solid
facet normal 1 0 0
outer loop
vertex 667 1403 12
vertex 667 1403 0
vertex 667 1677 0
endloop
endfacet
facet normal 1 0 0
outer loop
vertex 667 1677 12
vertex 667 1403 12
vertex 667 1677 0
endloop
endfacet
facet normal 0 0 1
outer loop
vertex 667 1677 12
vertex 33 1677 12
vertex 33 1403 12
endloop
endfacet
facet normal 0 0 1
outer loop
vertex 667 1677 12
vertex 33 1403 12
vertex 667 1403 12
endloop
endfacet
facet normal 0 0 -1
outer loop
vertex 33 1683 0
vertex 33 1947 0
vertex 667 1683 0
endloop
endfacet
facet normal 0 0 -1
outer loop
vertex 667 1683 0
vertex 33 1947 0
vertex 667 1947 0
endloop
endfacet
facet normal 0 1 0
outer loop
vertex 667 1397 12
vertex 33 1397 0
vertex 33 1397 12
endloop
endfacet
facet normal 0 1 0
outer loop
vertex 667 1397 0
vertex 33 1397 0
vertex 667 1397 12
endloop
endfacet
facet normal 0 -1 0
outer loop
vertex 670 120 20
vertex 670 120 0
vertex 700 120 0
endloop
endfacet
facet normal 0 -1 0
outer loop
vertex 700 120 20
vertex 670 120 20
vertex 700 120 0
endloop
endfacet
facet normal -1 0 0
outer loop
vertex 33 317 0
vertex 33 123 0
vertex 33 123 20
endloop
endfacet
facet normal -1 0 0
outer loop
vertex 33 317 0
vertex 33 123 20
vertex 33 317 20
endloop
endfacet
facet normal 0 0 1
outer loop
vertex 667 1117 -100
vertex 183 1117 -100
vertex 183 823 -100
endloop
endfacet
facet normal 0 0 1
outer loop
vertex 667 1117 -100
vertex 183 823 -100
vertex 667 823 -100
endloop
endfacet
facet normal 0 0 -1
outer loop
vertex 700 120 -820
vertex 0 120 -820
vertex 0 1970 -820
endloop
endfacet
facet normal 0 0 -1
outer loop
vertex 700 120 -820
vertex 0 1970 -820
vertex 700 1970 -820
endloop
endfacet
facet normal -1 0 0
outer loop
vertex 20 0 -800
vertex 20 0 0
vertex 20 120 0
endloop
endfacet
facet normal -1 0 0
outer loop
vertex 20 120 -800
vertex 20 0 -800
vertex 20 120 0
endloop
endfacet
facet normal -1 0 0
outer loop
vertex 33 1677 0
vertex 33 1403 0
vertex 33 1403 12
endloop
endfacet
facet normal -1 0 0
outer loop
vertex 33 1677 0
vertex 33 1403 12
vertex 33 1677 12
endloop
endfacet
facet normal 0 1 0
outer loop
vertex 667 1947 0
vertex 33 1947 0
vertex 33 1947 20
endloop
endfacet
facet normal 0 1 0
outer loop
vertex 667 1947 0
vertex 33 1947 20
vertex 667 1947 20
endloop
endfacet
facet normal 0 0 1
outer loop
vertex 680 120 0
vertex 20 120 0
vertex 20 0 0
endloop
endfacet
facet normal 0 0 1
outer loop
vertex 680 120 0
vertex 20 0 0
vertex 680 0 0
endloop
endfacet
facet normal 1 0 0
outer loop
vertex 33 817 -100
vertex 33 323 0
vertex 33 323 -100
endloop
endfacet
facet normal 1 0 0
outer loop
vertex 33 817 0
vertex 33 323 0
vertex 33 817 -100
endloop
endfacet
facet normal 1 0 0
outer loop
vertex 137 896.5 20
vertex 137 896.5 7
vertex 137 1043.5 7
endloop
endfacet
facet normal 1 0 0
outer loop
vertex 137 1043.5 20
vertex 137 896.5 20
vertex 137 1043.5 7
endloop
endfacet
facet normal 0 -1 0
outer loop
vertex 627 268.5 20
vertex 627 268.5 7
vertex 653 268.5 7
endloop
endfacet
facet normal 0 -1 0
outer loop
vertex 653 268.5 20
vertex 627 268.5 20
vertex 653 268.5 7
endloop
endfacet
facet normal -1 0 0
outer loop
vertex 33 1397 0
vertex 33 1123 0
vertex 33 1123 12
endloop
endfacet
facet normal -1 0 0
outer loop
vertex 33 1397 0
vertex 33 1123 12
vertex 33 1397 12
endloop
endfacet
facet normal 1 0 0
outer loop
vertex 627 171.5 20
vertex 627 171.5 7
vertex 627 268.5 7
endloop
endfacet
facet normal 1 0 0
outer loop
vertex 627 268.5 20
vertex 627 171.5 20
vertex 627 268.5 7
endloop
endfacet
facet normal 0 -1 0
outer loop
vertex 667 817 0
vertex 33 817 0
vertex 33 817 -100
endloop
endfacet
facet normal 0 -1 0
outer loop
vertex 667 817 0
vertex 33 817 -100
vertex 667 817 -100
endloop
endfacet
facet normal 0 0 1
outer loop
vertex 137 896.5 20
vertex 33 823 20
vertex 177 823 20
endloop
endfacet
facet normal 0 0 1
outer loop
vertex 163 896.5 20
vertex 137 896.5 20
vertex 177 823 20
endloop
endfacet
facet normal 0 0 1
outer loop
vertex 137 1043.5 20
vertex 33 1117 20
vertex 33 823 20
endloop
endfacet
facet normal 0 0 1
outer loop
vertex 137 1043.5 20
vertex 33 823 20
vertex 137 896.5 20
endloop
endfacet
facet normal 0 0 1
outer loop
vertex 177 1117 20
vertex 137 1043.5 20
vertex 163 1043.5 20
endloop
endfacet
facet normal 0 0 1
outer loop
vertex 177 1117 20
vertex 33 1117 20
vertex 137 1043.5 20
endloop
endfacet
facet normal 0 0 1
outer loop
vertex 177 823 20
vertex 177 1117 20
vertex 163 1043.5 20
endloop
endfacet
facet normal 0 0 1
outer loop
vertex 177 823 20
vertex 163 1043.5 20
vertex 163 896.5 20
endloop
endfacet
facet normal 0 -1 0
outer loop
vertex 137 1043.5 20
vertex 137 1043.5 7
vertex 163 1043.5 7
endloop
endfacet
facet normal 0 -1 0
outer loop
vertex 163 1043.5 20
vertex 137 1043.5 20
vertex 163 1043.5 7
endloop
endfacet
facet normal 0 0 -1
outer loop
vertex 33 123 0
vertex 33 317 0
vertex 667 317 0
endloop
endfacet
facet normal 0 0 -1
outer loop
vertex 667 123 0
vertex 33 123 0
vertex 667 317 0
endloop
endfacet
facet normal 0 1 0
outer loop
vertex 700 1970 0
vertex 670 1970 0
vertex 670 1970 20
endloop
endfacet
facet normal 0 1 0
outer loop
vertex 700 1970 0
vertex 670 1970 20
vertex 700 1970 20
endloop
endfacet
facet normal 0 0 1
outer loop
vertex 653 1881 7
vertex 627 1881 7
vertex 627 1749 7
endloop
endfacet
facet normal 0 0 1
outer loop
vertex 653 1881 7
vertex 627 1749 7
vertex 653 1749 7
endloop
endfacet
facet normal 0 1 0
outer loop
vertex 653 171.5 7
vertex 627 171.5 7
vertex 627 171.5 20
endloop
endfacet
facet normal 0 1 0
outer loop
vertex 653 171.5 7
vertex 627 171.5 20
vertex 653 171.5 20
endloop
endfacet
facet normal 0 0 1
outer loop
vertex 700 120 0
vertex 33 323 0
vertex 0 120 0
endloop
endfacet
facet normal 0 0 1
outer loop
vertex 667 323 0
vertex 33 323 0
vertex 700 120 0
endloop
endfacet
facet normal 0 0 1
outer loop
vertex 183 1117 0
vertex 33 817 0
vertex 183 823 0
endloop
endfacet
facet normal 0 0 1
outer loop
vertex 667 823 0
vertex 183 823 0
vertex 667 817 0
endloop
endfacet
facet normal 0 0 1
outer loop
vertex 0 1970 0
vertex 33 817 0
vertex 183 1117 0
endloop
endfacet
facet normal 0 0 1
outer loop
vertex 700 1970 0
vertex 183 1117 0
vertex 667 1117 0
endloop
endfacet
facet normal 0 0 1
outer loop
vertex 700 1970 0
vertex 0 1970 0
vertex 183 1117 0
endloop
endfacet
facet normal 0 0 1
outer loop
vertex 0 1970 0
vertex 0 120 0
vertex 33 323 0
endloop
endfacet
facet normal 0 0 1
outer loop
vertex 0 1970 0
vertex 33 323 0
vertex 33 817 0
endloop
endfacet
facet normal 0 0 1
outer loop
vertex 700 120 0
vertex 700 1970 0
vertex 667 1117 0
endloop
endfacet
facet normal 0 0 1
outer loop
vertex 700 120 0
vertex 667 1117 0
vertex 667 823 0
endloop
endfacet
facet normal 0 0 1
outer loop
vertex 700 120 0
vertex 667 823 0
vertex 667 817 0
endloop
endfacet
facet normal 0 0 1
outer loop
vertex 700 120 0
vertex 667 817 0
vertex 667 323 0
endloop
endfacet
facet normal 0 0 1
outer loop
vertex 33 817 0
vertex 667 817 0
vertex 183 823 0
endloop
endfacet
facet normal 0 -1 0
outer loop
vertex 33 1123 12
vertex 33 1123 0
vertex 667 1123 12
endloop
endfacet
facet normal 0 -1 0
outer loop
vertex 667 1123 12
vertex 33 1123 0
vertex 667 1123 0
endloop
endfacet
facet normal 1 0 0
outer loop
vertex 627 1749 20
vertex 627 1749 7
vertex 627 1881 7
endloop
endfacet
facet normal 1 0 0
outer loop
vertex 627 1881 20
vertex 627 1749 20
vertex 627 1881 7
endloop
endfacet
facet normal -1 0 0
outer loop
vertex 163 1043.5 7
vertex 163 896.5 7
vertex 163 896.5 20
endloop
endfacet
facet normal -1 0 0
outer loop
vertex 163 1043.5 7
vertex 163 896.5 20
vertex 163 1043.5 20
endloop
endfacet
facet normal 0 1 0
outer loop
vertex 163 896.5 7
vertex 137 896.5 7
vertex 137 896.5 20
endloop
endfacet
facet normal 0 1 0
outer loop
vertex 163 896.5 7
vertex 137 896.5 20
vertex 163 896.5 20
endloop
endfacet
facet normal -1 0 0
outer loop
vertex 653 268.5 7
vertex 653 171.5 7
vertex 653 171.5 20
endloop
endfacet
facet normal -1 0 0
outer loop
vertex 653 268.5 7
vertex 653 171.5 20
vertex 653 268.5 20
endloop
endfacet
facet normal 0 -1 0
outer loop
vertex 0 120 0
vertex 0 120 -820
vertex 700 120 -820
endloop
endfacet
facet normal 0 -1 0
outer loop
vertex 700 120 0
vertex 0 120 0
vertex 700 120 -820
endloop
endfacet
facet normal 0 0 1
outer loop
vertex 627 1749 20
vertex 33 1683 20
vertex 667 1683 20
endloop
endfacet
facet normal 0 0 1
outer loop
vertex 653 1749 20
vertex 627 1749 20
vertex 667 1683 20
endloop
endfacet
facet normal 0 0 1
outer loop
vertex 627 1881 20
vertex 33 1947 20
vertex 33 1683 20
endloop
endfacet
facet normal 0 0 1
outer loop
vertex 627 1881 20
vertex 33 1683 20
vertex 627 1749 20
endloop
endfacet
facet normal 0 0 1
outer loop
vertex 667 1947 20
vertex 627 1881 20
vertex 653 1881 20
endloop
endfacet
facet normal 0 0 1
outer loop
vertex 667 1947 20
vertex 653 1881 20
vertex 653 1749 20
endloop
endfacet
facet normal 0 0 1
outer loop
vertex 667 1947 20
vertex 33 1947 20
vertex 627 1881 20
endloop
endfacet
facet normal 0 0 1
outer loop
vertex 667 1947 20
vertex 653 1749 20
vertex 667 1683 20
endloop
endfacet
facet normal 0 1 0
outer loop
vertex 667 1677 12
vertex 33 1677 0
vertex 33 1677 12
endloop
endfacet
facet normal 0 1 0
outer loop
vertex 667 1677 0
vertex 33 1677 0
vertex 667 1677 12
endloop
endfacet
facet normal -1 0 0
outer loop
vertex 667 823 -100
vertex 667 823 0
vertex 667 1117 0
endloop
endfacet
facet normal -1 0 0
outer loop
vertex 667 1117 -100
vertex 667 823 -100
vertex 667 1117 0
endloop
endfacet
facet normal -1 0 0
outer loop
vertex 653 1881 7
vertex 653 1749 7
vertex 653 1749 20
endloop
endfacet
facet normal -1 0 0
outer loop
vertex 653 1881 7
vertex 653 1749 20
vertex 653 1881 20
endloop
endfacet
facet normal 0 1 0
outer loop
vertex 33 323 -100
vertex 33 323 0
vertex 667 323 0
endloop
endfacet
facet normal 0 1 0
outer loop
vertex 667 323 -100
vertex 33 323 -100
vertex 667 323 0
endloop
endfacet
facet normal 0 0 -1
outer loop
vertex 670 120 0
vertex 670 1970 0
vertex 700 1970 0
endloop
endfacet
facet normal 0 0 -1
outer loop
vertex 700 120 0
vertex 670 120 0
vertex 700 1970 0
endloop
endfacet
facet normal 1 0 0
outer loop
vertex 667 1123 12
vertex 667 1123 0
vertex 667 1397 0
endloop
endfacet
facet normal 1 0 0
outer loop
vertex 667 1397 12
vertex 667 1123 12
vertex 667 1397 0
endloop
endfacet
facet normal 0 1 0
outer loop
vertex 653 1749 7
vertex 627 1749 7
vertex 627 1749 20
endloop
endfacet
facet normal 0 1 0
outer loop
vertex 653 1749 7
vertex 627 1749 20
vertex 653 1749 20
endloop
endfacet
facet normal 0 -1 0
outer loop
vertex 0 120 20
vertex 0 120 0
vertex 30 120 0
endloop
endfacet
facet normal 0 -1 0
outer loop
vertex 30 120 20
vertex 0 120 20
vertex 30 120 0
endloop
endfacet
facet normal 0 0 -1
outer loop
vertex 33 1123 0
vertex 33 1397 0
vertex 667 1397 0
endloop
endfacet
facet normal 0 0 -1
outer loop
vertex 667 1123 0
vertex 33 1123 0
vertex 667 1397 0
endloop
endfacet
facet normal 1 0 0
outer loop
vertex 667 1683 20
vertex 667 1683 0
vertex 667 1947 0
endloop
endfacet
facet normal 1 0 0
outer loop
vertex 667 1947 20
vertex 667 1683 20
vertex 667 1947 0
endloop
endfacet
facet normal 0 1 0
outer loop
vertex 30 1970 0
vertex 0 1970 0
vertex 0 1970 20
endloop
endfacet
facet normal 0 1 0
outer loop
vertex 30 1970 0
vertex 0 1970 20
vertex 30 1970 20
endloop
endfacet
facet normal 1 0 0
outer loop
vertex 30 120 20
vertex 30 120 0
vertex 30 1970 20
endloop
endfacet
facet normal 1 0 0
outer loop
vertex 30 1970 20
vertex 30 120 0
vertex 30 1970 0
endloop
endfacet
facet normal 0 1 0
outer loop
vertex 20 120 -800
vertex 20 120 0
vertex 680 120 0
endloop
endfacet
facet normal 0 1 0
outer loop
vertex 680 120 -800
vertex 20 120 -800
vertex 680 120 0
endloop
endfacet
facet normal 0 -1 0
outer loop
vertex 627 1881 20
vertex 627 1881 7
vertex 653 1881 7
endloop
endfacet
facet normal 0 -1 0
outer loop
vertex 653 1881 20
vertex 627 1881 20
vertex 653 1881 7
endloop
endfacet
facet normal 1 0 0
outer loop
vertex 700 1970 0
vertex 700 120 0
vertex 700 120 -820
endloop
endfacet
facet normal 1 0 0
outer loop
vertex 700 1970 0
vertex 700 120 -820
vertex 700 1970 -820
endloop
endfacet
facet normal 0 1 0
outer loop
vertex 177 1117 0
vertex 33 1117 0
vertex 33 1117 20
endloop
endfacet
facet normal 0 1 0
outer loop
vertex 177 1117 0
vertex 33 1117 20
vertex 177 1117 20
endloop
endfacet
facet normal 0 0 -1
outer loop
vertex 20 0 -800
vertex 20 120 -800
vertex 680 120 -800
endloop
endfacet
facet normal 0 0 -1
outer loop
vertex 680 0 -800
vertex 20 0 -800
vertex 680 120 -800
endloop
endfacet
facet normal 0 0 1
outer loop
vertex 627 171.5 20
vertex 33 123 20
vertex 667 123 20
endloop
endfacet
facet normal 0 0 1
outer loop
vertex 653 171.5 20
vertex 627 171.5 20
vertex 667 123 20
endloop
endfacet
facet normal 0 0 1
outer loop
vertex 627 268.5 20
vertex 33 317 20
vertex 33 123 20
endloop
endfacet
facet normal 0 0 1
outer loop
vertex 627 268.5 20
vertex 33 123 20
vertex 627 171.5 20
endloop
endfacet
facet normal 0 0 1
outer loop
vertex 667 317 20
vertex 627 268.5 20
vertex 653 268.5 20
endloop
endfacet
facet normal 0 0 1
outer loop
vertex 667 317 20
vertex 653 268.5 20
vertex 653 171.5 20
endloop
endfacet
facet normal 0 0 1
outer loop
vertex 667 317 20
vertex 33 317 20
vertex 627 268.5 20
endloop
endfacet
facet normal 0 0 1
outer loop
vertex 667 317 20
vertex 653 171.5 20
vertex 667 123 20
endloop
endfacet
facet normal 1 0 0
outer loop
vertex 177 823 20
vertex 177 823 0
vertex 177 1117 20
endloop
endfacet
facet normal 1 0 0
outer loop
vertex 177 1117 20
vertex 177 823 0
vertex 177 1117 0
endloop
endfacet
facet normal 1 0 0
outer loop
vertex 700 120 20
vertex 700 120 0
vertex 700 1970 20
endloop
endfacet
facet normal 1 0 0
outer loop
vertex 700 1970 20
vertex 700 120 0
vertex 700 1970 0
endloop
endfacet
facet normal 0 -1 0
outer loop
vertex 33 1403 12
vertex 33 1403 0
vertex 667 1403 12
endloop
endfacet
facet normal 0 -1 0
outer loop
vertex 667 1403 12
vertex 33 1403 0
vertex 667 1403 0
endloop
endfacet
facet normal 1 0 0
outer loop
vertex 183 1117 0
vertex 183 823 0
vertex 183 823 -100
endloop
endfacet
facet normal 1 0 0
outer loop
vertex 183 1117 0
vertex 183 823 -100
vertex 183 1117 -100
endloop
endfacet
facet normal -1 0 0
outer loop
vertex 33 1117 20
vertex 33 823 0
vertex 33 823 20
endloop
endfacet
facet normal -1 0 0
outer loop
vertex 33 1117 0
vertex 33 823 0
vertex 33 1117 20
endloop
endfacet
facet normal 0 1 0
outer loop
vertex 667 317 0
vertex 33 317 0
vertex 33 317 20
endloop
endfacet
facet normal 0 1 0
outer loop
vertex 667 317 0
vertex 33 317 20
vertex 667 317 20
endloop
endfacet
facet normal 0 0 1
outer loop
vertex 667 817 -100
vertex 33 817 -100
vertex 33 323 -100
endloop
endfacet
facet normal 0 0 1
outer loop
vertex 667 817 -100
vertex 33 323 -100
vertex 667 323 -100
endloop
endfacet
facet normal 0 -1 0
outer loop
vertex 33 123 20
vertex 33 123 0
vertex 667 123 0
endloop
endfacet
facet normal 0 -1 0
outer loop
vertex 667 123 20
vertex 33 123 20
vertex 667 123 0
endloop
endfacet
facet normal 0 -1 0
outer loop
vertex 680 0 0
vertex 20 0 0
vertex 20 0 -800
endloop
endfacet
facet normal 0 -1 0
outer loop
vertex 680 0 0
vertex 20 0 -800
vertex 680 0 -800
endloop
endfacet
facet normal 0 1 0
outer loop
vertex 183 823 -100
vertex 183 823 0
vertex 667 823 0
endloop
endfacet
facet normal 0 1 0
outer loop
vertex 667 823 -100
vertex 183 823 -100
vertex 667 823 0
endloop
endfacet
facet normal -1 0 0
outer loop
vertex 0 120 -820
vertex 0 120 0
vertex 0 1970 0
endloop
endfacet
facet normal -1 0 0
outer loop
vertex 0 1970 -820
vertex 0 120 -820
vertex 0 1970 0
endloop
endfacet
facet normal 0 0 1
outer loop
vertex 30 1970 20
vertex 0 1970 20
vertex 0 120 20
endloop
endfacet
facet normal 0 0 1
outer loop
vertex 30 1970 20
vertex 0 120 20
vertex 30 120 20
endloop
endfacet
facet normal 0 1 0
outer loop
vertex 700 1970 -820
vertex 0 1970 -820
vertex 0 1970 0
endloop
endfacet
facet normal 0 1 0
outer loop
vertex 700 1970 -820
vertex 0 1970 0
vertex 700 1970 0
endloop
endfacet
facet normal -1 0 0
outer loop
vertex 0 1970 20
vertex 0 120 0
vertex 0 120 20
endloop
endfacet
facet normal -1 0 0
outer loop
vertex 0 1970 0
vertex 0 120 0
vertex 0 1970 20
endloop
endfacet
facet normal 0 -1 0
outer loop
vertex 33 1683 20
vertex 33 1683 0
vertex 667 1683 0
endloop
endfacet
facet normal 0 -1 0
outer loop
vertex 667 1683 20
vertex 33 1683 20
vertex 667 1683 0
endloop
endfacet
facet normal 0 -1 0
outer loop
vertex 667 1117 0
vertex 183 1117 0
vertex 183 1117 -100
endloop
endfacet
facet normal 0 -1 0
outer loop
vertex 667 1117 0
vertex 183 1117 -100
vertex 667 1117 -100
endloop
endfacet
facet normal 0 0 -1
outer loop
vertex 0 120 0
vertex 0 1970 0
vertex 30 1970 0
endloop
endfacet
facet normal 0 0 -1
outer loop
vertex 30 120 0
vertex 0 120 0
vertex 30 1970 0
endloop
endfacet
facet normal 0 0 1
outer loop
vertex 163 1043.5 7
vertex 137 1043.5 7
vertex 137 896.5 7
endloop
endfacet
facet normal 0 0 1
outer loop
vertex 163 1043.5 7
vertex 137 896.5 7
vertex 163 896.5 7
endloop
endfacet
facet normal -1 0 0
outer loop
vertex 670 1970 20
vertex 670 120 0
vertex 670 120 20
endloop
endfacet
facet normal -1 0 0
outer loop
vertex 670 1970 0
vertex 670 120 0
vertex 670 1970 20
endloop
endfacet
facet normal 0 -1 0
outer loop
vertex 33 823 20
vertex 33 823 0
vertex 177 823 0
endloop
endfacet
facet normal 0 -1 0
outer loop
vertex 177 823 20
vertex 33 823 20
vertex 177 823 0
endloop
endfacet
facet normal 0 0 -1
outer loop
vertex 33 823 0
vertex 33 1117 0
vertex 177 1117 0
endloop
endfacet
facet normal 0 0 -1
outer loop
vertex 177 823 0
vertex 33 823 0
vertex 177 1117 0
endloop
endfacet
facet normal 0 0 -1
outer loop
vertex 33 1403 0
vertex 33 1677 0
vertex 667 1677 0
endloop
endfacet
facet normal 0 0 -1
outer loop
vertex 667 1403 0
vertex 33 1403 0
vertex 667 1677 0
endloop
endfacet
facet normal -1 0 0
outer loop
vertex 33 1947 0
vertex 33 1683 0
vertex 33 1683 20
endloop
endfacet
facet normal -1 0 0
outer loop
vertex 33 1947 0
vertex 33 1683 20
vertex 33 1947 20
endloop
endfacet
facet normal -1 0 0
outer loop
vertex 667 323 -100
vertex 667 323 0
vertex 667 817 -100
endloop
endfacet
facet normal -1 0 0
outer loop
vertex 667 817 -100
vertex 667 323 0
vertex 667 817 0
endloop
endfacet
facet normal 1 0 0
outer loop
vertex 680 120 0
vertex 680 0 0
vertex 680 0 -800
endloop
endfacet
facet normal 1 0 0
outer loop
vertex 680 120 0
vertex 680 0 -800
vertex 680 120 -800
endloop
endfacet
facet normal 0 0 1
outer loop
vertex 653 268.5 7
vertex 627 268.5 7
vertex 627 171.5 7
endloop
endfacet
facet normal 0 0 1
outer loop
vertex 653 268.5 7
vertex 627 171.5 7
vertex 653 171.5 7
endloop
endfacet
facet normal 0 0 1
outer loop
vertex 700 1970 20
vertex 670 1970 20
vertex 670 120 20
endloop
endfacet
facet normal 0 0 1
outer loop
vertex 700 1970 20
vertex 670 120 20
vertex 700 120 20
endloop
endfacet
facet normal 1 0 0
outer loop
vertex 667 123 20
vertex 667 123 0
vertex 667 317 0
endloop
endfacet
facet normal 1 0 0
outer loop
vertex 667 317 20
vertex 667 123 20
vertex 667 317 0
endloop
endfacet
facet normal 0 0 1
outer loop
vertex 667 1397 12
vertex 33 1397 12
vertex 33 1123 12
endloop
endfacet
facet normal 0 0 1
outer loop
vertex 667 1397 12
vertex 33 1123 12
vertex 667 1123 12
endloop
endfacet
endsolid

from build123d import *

# Parameters (mm, degrees)
SKETCH1_W                   = 700
SKETCH1_H                   = 1850
GOVDE_KASA_DEPTH            = 820
SKETCH2_W                   = 660
SKETCH2_H                   = 120
PLINT_DEPTH                 = 800
SKETCH3_W                   = 30
SKETCH3_H                   = 1850
SOVE_SOL_DEPTH              = 20
SKETCH4_W                   = 30
SKETCH4_H                   = 1850
SOVE_SAG_DEPTH              = 20
SKETCH5_W                   = 634
SKETCH5_H                   = 264
KAPAK_FAN_FILTRE_DEPTH      = 20
KAPAK_FAN_FILTRE_KULP_START = 7
SKETCH6_W                   = 26
SKETCH6_H                   = 132
KAPAK_FAN_FILTRE_KULP_DEPTH = 13
SKETCH7_W                   = 634
SKETCH7_H                   = 274
FIRIN_KAPAK_2_CAM_DEPTH     = 12
SKETCH8_W                   = 634
SKETCH8_H                   = 274
FIRIN_KAPAK_1_CAM_DEPTH     = 12
SKETCH9_W                   = 144
SKETCH9_H                   = 294
KAPAK_YAG_KABI_DEPTH        = 20
KAPAK_YAG_KABI_KULP_START   = 7
SKETCH10_W                  = 26
SKETCH10_H                  = 147
KAPAK_YAG_KABI_KULP_DEPTH   = 13
SKETCH11_W                  = 484
SKETCH11_H                  = 294
ACIKLIK_SPREY_DEPTH         = 100
SKETCH12_W                  = 634
SKETCH12_H                  = 494
ACIKLIK_KESME_DEPTH         = 100
SKETCH13_W                  = 634
SKETCH13_H                  = 194
KAPAK_PANO_DEPTH            = 20
KAPAK_PANO_KULP_START       = 7
SKETCH14_W                  = 26
SKETCH14_H                  = 97
KAPAK_PANO_KULP_DEPTH       = 13


with BuildPart() as part:
    # Sketch1 → govde_kasa (new body)
    with BuildSketch(Plane.XY):
        with Locations((350, 1045)):
            Rectangle(SKETCH1_W, SKETCH1_H)
    extrude(amount=-GOVDE_KASA_DEPTH)

    # Sketch11 → aciklik_sprey (cut)
    with BuildSketch(Plane.XY):
        with Locations((425, 970)):
            Rectangle(SKETCH11_W, SKETCH11_H)
    extrude(amount=-ACIKLIK_SPREY_DEPTH, mode=Mode.SUBTRACT)

    # Sketch12 → aciklik_kesme (cut)
    with BuildSketch(Plane.XY):
        with Locations((350, 570)):
            Rectangle(SKETCH12_W, SKETCH12_H)
    extrude(amount=-ACIKLIK_KESME_DEPTH, mode=Mode.SUBTRACT)


with BuildPart() as body_2:
    # Sketch2 → plint (new body)
    with BuildSketch(Plane.XY):
        with Locations((350, 60)):
            Rectangle(SKETCH2_W, SKETCH2_H)
    extrude(amount=-PLINT_DEPTH)


with BuildPart() as body_3:
    # Sketch3 → sove_sol (new body)
    with BuildSketch(Plane.XY):
        with Locations((15, 1045)):
            Rectangle(SKETCH3_W, SKETCH3_H)
    extrude(amount=SOVE_SOL_DEPTH)


with BuildPart() as body_4:
    # Sketch4 → sove_sag (new body)
    with BuildSketch(Plane.XY):
        with Locations((685, 1045)):
            Rectangle(SKETCH4_W, SKETCH4_H)
    extrude(amount=SOVE_SAG_DEPTH)


with BuildPart() as body_5:
    # Sketch5 → kapak_fan_filtre (new body)
    with BuildSketch(Plane.XY):
        with Locations((350, 1815)):
            Rectangle(SKETCH5_W, SKETCH5_H)
    extrude(amount=KAPAK_FAN_FILTRE_DEPTH)

    # Sketch6 → kapak_fan_filtre_kulp (cut)
    with BuildSketch(Plane.XY.offset(KAPAK_FAN_FILTRE_KULP_START)):
        with Locations((640, 1815)):
            Rectangle(SKETCH6_W, SKETCH6_H)
    extrude(amount=KAPAK_FAN_FILTRE_KULP_DEPTH, mode=Mode.SUBTRACT)


with BuildPart() as body_6:
    # Sketch7 → firin_kapak_2_cam (new body)
    with BuildSketch(Plane.XY):
        with Locations((350, 1540)):
            Rectangle(SKETCH7_W, SKETCH7_H)
    extrude(amount=FIRIN_KAPAK_2_CAM_DEPTH)


with BuildPart() as body_7:
    # Sketch8 → firin_kapak_1_cam (new body)
    with BuildSketch(Plane.XY):
        with Locations((350, 1260)):
            Rectangle(SKETCH8_W, SKETCH8_H)
    extrude(amount=FIRIN_KAPAK_1_CAM_DEPTH)


with BuildPart() as body_8:
    # Sketch9 → kapak_yag_kabi (new body)
    with BuildSketch(Plane.XY):
        with Locations((105, 970)):
            Rectangle(SKETCH9_W, SKETCH9_H)
    extrude(amount=KAPAK_YAG_KABI_DEPTH)

    # Sketch10 → kapak_yag_kabi_kulp (cut)
    with BuildSketch(Plane.XY.offset(KAPAK_YAG_KABI_KULP_START)):
        with Locations((150, 970)):
            Rectangle(SKETCH10_W, SKETCH10_H)
    extrude(amount=KAPAK_YAG_KABI_KULP_DEPTH, mode=Mode.SUBTRACT)


with BuildPart() as body_9:
    # Sketch13 → kapak_pano (new body)
    with BuildSketch(Plane.XY):
        with Locations((350, 220)):
            Rectangle(SKETCH13_W, SKETCH13_H)
    extrude(amount=KAPAK_PANO_DEPTH)

    # Sketch14 → kapak_pano_kulp (cut)
    with BuildSketch(Plane.XY.offset(KAPAK_PANO_KULP_START)):
        with Locations((640, 220)):
            Rectangle(SKETCH14_W, SKETCH14_H)
    extrude(amount=KAPAK_PANO_KULP_DEPTH, mode=Mode.SUBTRACT)


solid = Compound([part.part, body_2.part, body_3.part, body_4.part, body_5.part, body_6.part, body_7.part, body_8.part, body_9.part])
